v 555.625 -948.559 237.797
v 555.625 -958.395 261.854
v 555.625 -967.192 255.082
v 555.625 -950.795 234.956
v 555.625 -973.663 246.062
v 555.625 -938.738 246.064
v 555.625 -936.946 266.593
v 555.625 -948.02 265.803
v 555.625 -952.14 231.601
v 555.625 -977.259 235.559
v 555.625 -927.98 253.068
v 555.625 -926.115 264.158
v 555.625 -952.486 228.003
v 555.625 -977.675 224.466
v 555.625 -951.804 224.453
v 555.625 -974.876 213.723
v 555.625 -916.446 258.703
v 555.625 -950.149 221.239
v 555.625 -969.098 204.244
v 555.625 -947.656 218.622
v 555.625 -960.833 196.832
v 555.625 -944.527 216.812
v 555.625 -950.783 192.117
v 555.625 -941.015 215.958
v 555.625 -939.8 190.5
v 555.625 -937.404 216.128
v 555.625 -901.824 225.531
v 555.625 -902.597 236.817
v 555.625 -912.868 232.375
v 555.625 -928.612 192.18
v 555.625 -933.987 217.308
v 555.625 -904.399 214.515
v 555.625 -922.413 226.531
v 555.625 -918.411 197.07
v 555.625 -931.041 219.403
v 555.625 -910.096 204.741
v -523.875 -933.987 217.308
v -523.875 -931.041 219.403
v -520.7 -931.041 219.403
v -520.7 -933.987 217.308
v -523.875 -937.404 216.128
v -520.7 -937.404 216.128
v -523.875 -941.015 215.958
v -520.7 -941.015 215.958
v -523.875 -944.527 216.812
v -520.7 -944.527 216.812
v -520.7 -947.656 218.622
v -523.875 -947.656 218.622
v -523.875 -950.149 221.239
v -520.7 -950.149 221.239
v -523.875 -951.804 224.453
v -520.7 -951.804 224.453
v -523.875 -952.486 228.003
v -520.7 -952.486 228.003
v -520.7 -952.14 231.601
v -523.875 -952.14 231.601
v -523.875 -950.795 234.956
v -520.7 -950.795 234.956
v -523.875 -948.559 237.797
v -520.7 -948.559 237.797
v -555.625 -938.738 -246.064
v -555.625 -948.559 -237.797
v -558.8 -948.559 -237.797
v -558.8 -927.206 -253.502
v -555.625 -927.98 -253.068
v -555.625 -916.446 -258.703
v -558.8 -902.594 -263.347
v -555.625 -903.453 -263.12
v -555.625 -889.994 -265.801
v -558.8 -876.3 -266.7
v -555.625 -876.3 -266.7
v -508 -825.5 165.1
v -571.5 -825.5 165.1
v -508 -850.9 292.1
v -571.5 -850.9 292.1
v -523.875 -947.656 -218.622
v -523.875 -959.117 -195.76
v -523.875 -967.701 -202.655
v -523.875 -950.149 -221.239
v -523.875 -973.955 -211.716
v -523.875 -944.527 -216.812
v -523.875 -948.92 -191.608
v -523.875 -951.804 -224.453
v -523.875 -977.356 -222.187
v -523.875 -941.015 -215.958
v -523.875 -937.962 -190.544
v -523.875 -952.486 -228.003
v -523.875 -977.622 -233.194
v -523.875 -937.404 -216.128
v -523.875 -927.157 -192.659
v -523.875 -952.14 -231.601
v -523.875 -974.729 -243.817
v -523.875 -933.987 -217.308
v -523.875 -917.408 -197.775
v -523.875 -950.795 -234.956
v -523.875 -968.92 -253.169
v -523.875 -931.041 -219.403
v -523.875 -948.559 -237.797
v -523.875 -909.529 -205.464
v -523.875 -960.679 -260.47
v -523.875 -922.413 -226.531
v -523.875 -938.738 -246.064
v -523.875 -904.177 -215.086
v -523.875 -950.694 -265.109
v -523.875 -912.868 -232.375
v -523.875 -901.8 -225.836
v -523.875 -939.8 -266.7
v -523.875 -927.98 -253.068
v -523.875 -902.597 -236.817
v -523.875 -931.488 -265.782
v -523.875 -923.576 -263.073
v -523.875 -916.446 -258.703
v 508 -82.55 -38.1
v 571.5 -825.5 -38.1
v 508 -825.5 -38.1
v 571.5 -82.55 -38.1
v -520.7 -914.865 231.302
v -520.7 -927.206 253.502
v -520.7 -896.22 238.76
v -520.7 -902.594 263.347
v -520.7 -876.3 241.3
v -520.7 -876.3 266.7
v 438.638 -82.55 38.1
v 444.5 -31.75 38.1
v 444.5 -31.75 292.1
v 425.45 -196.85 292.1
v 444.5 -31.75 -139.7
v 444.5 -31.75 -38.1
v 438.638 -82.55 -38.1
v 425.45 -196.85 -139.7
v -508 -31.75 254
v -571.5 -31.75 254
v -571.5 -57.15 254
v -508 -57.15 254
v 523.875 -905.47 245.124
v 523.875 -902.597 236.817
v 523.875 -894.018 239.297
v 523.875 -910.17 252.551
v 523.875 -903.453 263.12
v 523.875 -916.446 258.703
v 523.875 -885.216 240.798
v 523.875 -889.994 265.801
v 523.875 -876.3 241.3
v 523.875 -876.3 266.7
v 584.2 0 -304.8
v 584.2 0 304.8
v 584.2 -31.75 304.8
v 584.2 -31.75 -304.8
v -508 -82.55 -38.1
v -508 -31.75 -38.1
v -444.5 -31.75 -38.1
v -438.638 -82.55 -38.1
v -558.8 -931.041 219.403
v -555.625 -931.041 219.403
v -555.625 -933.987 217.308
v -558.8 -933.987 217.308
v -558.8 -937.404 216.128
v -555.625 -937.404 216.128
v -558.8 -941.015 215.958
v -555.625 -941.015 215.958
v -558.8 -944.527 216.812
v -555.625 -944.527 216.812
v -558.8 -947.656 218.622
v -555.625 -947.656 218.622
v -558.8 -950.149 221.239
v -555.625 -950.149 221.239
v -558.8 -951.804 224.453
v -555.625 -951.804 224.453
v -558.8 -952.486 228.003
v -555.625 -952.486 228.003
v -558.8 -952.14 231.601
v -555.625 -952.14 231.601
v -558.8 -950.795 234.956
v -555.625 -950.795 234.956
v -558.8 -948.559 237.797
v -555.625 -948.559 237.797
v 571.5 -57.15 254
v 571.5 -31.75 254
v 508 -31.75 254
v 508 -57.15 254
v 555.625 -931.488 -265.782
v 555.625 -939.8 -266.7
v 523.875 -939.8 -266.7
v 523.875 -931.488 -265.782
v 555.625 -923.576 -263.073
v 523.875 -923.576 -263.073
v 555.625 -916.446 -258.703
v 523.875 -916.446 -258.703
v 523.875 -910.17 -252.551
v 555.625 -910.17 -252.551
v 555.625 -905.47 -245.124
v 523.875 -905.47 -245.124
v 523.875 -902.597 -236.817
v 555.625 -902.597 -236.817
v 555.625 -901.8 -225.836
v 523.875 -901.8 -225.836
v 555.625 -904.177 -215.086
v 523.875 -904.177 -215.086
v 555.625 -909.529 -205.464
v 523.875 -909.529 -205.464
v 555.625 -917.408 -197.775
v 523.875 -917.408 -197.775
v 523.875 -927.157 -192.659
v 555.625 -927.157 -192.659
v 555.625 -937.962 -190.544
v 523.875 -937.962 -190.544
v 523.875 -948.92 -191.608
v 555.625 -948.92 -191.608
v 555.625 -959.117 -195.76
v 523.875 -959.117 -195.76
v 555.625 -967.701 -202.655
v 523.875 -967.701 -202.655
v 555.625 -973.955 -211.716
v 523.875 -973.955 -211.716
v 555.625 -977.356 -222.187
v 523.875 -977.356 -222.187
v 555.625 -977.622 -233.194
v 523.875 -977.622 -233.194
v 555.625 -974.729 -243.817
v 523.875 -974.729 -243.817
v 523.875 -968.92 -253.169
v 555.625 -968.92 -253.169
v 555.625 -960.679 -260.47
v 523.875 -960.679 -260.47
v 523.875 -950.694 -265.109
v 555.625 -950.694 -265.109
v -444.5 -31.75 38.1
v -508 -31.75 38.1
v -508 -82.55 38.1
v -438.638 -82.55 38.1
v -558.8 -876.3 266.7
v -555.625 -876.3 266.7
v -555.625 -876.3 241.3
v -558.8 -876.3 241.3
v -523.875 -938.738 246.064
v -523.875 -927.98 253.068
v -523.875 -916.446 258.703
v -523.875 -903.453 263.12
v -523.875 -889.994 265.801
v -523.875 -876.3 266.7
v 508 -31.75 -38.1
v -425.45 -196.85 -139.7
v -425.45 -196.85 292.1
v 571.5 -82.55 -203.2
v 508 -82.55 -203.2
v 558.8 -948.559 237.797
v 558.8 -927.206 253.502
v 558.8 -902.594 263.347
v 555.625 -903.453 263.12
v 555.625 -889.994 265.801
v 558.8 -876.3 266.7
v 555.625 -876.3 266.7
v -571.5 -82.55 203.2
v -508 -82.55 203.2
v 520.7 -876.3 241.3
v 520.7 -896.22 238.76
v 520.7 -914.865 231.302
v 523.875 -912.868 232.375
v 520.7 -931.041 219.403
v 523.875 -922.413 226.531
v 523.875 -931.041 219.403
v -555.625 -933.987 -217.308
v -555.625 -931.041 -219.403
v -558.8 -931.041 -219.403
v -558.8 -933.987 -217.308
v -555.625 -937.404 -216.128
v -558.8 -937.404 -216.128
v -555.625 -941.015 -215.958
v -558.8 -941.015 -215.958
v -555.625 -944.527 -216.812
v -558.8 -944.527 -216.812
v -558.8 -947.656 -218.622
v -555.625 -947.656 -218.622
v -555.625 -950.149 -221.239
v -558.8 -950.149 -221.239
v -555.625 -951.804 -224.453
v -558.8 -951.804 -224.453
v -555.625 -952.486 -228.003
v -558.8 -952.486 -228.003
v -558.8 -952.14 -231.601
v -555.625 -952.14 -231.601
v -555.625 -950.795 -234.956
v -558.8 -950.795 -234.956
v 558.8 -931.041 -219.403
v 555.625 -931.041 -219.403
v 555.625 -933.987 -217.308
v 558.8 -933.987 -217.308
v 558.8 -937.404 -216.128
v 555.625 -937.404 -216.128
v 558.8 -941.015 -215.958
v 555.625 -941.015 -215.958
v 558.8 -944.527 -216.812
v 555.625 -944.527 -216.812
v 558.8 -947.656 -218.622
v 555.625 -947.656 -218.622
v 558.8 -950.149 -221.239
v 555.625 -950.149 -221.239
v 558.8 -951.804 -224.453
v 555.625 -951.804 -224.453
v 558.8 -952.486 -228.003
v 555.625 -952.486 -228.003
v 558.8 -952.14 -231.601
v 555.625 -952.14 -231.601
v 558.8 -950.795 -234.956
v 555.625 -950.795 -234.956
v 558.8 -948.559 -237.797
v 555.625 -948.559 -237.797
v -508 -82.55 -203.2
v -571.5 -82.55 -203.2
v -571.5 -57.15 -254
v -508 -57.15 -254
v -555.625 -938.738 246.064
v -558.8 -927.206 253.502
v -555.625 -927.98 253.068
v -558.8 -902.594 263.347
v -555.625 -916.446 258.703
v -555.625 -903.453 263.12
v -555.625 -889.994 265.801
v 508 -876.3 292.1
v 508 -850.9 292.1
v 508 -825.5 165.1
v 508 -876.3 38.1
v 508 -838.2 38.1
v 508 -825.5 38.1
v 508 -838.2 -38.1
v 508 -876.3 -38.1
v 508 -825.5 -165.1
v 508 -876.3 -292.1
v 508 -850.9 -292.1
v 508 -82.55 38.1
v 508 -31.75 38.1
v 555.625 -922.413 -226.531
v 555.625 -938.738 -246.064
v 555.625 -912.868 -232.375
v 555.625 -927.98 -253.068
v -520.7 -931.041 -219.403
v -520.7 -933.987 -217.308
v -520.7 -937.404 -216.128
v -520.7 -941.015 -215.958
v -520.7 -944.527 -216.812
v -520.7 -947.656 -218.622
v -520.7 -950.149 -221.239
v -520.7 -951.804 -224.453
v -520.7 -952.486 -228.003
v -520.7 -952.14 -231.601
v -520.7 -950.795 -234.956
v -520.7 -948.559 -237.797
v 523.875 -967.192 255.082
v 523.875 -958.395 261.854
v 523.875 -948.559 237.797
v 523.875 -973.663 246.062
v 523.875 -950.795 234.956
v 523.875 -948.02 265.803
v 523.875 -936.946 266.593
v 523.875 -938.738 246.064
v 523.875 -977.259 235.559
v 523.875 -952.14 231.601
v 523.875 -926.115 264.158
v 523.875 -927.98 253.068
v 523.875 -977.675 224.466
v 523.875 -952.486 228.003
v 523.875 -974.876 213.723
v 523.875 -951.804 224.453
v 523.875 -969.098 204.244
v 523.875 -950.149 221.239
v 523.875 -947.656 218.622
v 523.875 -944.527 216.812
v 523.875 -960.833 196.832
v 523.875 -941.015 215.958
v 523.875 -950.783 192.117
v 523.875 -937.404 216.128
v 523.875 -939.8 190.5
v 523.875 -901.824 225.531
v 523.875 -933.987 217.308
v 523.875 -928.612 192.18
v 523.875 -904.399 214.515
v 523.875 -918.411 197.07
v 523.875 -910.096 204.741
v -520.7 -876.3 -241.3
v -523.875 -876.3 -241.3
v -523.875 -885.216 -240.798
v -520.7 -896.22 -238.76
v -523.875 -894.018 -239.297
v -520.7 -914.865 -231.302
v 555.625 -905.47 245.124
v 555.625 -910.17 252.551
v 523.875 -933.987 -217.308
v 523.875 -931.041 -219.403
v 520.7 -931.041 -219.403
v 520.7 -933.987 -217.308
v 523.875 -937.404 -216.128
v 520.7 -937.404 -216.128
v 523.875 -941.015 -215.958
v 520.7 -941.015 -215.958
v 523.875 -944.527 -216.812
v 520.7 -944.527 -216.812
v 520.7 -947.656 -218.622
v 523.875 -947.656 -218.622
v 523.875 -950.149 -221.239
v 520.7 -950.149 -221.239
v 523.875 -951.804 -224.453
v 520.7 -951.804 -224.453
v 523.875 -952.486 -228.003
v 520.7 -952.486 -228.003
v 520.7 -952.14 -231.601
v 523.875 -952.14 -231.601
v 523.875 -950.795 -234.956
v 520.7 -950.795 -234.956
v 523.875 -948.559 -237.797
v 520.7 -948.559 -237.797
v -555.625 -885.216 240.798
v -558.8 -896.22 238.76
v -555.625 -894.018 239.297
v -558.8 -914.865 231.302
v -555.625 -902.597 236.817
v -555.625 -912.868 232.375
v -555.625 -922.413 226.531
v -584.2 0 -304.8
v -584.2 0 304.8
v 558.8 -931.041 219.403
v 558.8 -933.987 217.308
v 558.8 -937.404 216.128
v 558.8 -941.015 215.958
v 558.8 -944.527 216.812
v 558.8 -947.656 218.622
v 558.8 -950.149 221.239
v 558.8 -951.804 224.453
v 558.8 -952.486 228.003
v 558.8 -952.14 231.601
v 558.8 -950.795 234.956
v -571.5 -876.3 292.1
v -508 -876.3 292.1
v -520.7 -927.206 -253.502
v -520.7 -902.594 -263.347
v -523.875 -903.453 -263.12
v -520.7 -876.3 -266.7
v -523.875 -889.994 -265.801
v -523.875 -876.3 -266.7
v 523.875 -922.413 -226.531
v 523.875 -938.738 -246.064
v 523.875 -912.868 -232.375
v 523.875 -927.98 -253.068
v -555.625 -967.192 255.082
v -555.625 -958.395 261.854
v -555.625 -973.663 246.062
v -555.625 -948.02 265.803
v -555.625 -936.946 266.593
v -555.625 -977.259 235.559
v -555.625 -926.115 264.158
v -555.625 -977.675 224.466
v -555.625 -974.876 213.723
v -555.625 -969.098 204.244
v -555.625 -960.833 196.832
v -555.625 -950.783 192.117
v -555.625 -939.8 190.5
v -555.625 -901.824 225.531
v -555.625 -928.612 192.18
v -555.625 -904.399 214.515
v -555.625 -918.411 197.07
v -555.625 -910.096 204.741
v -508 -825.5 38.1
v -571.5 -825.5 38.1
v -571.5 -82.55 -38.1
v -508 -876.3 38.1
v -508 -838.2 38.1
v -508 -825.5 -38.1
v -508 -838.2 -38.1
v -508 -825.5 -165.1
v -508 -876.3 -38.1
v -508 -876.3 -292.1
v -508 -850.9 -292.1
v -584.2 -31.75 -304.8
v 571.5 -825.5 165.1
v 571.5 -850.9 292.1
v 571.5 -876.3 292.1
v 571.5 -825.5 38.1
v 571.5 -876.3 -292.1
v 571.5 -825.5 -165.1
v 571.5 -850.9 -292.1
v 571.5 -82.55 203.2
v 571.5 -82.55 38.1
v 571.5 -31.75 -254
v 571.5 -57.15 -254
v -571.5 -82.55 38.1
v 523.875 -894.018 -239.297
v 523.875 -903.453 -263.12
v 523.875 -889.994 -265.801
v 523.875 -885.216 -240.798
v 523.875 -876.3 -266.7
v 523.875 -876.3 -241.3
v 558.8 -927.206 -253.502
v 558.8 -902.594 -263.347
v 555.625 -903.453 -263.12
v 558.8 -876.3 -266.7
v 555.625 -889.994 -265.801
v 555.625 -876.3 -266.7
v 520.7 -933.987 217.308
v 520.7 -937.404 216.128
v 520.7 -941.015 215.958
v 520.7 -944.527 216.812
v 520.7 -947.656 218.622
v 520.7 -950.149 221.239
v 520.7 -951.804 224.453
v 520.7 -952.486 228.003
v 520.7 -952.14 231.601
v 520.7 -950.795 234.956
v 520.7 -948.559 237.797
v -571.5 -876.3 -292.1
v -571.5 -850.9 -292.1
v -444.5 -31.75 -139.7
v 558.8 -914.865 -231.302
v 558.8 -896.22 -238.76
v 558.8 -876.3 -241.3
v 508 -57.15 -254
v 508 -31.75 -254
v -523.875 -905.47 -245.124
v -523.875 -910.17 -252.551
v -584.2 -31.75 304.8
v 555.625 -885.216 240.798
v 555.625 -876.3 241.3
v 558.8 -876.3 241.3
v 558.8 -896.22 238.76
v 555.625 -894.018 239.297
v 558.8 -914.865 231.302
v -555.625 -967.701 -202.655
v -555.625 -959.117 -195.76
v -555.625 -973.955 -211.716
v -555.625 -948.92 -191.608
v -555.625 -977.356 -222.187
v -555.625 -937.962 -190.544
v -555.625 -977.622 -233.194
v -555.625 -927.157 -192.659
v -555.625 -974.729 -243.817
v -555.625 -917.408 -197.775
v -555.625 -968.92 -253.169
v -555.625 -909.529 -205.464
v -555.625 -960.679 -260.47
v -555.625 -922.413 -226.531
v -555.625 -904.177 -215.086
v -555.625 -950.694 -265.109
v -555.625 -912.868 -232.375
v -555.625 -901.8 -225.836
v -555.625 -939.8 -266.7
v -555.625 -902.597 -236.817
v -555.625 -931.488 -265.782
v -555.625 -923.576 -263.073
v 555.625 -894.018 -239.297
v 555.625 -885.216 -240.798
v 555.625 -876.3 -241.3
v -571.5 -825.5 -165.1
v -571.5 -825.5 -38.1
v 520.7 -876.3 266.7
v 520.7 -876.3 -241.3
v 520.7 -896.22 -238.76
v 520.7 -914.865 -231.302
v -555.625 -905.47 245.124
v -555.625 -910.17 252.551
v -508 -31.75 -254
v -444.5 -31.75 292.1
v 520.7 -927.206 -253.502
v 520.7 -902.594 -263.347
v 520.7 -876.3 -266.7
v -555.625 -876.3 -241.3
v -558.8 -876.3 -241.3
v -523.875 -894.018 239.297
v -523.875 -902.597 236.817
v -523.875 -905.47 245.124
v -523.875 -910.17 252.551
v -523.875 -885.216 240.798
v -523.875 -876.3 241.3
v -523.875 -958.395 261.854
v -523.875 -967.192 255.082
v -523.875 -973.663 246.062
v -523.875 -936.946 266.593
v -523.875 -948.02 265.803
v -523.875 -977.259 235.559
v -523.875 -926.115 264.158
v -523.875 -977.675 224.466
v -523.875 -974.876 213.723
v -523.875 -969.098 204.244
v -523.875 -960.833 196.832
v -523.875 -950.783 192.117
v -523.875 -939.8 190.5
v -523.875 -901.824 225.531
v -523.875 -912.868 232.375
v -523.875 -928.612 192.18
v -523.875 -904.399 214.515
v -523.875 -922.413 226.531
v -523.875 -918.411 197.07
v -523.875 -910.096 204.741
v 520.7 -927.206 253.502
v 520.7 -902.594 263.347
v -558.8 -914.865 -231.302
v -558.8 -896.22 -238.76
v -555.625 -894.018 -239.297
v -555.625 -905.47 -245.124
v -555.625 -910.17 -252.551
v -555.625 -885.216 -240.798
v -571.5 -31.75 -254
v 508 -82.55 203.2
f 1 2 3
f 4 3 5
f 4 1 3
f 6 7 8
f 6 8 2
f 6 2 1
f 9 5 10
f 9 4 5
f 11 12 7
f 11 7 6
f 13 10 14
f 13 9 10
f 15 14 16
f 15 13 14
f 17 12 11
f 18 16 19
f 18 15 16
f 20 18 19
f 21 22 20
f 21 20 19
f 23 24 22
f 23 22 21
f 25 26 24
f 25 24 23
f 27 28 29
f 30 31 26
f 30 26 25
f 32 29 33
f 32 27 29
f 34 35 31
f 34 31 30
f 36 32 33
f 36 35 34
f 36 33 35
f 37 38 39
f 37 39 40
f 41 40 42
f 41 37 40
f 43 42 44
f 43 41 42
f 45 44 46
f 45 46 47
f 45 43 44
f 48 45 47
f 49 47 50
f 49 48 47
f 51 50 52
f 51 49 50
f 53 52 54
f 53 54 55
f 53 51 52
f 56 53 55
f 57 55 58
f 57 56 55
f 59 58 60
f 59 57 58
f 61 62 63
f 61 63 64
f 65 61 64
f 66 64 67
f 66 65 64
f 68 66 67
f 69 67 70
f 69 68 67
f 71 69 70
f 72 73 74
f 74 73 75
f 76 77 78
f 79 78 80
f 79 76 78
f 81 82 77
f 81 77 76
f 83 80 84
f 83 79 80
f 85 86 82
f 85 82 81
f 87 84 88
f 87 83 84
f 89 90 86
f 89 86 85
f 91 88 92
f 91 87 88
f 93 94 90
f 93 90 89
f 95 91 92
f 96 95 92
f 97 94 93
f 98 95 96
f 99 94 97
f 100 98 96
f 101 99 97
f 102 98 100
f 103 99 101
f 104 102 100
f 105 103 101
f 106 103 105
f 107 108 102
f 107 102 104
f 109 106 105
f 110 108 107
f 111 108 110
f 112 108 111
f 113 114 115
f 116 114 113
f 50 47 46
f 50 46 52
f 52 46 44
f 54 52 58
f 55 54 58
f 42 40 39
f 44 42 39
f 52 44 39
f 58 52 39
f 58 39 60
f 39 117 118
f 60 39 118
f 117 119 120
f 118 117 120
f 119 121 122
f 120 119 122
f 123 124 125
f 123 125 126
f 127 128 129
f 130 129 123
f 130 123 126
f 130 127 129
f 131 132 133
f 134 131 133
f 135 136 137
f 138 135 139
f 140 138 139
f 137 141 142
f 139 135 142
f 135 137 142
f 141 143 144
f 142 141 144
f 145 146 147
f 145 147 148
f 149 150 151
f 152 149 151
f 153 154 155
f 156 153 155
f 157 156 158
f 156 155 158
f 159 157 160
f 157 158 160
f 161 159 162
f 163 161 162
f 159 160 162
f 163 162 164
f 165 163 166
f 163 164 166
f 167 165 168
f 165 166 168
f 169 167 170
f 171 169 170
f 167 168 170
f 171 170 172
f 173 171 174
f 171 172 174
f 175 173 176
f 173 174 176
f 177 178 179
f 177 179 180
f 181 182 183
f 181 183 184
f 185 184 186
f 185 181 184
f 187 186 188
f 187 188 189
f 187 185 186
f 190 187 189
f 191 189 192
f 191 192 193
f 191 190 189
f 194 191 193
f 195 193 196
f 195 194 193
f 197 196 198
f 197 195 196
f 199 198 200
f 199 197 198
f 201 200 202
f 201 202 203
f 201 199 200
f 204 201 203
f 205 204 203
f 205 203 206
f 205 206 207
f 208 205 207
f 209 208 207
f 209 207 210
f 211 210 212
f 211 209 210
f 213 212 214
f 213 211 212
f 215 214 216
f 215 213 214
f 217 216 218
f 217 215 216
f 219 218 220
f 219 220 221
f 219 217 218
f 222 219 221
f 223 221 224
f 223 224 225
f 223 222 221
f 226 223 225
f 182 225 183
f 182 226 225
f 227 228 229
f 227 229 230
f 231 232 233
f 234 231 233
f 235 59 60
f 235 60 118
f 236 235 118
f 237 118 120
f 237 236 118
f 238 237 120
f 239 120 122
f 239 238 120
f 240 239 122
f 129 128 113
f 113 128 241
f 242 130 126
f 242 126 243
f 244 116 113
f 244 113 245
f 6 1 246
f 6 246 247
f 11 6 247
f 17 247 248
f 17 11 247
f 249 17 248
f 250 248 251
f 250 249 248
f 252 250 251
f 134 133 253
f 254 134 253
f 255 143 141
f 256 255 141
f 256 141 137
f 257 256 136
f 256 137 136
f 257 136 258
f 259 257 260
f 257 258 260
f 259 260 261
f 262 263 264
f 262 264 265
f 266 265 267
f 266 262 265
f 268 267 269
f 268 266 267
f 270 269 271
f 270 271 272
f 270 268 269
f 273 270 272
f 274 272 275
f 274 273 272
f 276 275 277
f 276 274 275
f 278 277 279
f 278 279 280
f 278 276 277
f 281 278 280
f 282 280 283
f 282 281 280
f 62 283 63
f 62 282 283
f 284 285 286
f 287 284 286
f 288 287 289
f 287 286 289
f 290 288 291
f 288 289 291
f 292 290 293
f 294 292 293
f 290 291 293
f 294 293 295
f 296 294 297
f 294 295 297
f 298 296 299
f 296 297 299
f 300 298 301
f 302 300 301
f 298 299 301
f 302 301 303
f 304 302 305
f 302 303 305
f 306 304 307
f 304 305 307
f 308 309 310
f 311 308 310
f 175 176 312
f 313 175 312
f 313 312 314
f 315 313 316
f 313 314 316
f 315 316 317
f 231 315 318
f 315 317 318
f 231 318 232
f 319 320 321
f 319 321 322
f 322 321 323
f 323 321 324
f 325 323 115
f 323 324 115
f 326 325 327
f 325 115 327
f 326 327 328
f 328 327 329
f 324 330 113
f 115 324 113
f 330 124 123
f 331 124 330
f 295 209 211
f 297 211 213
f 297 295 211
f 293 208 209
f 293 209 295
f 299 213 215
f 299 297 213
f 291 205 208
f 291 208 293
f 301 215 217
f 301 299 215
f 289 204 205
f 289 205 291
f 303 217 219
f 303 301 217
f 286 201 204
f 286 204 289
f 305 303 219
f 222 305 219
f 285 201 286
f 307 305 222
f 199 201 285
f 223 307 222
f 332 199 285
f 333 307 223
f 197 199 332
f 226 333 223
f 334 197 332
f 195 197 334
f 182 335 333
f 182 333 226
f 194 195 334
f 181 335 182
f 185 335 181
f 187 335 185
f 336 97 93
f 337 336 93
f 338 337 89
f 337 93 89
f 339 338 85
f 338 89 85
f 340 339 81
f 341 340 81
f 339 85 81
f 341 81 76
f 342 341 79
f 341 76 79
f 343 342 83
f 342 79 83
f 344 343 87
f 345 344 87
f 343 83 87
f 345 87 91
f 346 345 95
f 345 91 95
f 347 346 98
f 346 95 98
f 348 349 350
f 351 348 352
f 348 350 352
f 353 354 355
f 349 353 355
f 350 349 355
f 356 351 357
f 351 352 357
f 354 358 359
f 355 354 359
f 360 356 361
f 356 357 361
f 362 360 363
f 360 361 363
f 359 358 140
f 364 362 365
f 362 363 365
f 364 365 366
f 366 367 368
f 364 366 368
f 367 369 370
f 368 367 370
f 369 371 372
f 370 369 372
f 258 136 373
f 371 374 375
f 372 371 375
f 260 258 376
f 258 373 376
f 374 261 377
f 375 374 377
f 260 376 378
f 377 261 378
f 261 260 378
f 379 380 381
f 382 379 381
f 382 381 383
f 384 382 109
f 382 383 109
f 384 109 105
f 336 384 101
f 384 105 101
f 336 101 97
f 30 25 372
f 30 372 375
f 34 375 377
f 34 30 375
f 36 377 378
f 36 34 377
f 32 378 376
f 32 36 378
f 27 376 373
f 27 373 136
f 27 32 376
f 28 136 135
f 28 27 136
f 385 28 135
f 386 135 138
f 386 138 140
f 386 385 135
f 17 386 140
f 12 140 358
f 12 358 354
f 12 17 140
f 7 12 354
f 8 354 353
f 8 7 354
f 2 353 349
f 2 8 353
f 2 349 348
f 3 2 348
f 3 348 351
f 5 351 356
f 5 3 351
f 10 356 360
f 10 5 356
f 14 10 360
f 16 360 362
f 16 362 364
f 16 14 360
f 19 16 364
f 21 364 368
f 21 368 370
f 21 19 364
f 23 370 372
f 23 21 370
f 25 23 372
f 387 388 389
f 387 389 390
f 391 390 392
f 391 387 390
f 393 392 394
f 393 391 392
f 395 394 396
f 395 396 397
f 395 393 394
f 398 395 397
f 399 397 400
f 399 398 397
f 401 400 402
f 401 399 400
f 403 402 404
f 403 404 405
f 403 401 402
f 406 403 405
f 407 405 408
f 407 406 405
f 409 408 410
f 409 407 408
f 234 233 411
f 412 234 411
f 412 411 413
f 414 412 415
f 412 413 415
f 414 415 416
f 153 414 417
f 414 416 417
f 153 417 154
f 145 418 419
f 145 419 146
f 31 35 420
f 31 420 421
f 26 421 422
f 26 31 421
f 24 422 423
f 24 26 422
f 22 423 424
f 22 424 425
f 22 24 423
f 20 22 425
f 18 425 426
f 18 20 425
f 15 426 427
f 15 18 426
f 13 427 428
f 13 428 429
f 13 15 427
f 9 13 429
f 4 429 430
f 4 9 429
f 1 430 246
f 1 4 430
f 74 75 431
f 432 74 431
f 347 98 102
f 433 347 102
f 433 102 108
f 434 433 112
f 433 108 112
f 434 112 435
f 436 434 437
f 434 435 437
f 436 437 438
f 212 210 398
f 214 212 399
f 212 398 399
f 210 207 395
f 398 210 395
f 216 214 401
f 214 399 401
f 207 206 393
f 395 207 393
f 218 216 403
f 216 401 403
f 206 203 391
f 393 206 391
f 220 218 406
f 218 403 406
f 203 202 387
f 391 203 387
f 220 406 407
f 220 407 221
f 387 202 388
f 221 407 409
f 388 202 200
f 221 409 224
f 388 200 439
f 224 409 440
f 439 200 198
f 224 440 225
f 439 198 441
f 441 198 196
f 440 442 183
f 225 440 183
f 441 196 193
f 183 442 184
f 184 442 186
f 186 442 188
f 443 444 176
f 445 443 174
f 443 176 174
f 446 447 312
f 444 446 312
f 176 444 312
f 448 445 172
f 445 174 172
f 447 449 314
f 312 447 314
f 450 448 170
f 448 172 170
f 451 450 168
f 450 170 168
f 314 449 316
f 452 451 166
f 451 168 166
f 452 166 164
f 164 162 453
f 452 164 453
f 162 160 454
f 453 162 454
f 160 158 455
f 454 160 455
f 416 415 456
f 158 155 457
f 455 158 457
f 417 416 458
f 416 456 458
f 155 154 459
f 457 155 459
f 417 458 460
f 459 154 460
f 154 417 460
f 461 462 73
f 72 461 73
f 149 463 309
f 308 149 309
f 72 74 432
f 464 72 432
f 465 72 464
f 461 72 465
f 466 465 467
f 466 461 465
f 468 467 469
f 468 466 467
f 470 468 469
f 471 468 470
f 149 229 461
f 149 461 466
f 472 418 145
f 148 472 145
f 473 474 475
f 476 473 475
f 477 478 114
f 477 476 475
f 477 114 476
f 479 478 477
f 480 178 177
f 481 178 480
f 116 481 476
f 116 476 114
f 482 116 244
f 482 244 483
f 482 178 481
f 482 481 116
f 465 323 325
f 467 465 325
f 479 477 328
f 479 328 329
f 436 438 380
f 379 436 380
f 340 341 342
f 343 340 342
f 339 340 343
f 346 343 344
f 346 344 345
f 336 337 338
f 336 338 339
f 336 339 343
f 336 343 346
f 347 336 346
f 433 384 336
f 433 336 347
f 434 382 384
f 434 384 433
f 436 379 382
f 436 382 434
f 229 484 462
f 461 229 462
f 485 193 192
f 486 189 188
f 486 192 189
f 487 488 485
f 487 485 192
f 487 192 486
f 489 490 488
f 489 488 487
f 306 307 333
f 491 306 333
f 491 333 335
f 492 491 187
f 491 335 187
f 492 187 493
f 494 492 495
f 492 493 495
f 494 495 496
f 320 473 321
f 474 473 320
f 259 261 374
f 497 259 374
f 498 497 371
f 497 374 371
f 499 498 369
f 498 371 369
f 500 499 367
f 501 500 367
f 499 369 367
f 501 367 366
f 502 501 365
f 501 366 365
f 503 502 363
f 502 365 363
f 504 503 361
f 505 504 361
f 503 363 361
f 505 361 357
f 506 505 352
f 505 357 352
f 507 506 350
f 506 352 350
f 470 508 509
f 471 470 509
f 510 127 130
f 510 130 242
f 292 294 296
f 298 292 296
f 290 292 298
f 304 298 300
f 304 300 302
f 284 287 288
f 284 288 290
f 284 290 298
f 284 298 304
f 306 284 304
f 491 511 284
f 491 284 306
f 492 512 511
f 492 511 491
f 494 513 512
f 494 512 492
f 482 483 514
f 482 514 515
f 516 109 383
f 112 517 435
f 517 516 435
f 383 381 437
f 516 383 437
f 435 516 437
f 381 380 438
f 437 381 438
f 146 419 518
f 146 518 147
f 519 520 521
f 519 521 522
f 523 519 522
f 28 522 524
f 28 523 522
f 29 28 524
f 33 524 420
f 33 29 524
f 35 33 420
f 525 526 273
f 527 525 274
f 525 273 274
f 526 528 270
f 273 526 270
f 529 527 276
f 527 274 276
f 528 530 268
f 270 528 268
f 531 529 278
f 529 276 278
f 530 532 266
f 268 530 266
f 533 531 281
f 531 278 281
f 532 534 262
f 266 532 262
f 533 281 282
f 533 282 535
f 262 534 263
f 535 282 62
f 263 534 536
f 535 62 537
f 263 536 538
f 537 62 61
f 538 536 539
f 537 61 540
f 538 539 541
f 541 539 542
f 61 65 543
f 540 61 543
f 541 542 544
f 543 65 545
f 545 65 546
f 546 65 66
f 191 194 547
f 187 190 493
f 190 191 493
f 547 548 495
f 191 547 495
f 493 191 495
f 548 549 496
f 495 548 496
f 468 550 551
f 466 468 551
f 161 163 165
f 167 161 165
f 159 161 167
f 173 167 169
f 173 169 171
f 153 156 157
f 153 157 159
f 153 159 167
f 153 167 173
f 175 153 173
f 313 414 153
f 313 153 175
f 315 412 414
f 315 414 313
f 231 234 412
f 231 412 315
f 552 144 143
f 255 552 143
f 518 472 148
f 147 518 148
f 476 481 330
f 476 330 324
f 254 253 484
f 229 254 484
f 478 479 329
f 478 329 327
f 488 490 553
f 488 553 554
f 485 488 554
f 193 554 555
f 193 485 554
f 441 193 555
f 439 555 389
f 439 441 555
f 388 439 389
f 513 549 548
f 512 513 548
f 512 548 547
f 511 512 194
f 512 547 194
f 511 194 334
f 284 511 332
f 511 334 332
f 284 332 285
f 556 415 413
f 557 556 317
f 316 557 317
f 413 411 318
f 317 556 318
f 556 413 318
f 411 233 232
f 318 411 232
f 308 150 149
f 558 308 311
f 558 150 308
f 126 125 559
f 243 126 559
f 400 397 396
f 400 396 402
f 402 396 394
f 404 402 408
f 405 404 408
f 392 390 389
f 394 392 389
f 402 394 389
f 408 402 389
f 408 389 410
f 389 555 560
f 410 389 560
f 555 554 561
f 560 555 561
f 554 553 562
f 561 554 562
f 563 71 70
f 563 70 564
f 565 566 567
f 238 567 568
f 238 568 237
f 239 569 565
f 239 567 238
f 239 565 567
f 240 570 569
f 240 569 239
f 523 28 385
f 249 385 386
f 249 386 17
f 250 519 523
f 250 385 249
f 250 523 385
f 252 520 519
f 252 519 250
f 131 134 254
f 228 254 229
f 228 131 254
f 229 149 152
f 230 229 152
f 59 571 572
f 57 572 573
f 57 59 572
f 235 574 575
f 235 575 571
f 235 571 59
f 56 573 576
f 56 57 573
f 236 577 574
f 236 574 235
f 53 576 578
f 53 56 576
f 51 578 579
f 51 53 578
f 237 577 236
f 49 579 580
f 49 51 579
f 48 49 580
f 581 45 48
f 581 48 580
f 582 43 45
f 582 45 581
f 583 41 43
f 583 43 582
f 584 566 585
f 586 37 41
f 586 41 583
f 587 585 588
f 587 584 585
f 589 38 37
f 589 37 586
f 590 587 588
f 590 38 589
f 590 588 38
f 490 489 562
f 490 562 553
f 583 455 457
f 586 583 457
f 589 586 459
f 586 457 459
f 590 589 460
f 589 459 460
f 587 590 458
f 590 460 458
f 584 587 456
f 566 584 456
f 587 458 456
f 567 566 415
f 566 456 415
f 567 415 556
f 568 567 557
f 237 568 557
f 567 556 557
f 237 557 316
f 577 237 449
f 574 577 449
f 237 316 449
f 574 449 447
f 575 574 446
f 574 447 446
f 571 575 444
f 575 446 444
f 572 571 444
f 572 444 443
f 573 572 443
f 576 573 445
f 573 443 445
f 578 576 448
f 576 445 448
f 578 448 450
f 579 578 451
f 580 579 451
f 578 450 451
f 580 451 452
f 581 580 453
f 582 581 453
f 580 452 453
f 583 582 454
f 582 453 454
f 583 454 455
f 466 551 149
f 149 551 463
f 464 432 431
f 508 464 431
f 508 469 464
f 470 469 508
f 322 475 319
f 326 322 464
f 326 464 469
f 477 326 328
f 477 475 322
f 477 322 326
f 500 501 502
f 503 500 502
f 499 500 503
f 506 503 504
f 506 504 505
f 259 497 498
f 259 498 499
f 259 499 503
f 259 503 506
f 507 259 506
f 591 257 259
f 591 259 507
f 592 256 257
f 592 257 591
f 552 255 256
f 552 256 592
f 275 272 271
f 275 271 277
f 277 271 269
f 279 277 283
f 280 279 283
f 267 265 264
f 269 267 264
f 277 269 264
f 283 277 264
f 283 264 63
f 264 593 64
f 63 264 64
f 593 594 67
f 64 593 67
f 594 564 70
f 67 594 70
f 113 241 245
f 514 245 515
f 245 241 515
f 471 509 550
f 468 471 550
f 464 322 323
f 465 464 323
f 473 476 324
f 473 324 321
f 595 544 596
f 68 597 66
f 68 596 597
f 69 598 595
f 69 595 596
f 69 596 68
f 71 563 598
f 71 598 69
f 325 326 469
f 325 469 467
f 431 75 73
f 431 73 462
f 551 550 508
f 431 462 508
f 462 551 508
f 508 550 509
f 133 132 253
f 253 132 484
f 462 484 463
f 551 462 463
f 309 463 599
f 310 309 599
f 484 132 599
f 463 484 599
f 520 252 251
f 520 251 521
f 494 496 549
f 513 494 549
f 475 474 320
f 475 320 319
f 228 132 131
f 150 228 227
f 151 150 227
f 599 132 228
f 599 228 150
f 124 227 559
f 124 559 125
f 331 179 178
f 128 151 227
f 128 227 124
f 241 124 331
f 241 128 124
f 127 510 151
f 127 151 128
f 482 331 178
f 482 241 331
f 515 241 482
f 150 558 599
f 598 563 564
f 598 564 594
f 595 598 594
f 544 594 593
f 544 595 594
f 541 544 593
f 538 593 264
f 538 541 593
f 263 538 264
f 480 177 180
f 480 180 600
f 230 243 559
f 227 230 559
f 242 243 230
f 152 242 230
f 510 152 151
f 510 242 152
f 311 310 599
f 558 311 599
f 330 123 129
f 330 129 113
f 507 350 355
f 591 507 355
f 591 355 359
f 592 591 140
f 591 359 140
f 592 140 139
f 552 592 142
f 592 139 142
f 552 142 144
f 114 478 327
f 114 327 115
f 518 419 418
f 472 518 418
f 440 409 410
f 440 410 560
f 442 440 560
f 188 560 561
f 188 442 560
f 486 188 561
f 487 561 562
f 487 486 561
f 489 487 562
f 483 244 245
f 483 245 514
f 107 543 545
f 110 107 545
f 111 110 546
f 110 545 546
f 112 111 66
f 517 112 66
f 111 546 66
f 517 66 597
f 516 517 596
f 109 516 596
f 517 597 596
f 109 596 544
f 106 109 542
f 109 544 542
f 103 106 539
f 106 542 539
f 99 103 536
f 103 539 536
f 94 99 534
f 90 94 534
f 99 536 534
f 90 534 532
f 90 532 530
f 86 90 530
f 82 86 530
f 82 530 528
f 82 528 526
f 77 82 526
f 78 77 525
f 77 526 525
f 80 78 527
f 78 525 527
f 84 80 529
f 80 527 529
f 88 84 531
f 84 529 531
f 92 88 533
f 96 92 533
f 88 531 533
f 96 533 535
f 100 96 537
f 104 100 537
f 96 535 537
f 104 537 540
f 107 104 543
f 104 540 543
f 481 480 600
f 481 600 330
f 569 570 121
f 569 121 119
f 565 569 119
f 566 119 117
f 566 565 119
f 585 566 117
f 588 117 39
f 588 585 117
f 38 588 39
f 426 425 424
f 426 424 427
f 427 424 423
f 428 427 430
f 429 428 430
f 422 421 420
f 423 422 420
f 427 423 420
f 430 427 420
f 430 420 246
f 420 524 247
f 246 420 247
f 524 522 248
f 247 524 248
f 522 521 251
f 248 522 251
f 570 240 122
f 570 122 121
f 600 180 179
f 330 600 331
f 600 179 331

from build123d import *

# Parameters (mm, degrees)
SKETCH2_W                       = 1168.4
SKETCH2_H                       = 609.6
BOSS_EXTRUDE1_DEPTH             = 31.75
SKETCH4_W                       = 1143
SKETCH4_H                       = 50.8
BOSS_EXTRUDE2_DEPTH             = 38.1
BOSS_EXTRUDE3_DEPTH             = 292.1
BOSS_EXTRUDE3_DEPTH_BACK        = 139.7
BOSS_EXTRUDE4_DEPTH             = 63.5
BOSS_EXTRUDE7_REACH             = 1098.401
SKETCH10_W                      = 76.2
SKETCH10_H                      = 38.1
BOSS_EXTRUDE7_DIRECTION_2_REACH = 1098.401
SKETCH8_R                       = 38.1
BOSS_EXTRUDE5_DEPTH             = 15.875
BOSS_EXTRUDE5_2_DEPTH           = 15.875
BOSS_EXTRUDE6_DEPTH             = 3.175


with BuildPart() as part:
    # Sketch2 → Boss-Extrude1 (new body)
    with BuildSketch(Plane(origin=(0, 0, 0), x_dir=(1, 0, 0), z_dir=(0, 1, 0))):
        Rectangle(SKETCH2_W, SKETCH2_H)
    extrude(amount=-BOSS_EXTRUDE1_DEPTH)


with BuildPart() as body_2:
    # Sketch4 → Boss-Extrude2 (new, symmetric)
    with BuildSketch(Plane.XY):
        with Locations((0, -57.15)):
            Rectangle(SKETCH4_W, SKETCH4_H)
    extrude(amount=BOSS_EXTRUDE2_DEPTH, both=True)

    # Sketch5 → Boss-Extrude3 (add, two sides: drawn at the far end of the back side and taken through both)
    with BuildSketch(Plane.XY.offset(-BOSS_EXTRUDE3_DEPTH_BACK)):
        Polygon((-444.5, -31.75), (444.5, -31.75), (425.45, -196.85), (-425.45, -196.85), align=None)
    extrude(amount=BOSS_EXTRUDE3_DEPTH + BOSS_EXTRUDE3_DEPTH_BACK)

    # Sketch6 → Boss-Extrude4 (add)
    with BuildSketch(Plane(origin=(571.5, 0, 0), x_dir=(0, 0, -1), z_dir=(1, 0, 0))):
        Polygon((-38.1, -825.5), (-165.1, -825.5), (-292.1, -850.9), (-292.1, -876.3), (292.1, -876.3), (292.1, -850.9), (165.1, -825.5), (38.1, -825.5), (38.1, -82.55), (203.2, -82.55), (254, -57.15), (254, -31.75), (-254, -31.75), (-254, -57.15), (-203.2, -82.55), (-38.1, -82.55), align=None)
    boss_extrude4 = extrude(amount=-BOSS_EXTRUDE4_DEPTH)

    # Mirror1: Boss-Extrude4 across plane
    add(boss_extrude4.mirror(Plane(origin=(0, 0, 0), x_dir=(0, 0, 1), z_dir=(1, 0, 0))))

    # Boss-Extrude7: up to this face of the body (flat: up to its plane)
    boss_extrude7_end = Plane(body_2.part.faces().sort_by_distance((508, -581.066100324, 0))[0])
    # Sketch10 → Boss-Extrude7 (add, up to the picked face)
    with BuildSketch(Plane(origin=(0, 0, 0), x_dir=(0, 0, -1), z_dir=(1, 0, 0)), mode=Mode.PRIVATE) as boss_extrude7_sk1:
        with Locations((0, -857.25)):
            Rectangle(SKETCH10_W, SKETCH10_H)
    boss_extrude7_tool1 = split(extrude(boss_extrude7_sk1.sketch, amount=BOSS_EXTRUDE7_REACH, mode=Mode.PRIVATE), bisect_by=boss_extrude7_end, keep=Keep.BOTH, mode=Mode.PRIVATE)
    add(boss_extrude7_tool1.solids().sort_by(Axis((0, -857.25, 0), (1, 0, 0)))[0])

    # Boss-Extrude7 direction 2: up to this face of the body (flat: up to its plane)
    boss_extrude7_direction_2_end = Plane(body_2.part.faces().sort_by_distance((-508, -581.066100324, 0))[0])
    # Sketch10 → Boss-Extrude7 direction 2 (add, up to the picked face)
    with BuildSketch(Plane(origin=(0, 0, 0), x_dir=(0, 0, -1), z_dir=(1, 0, 0)), mode=Mode.PRIVATE) as boss_extrude7_direction_2_sk1:
        with Locations((0, -857.25)):
            Rectangle(SKETCH10_W, SKETCH10_H)
    boss_extrude7_direction_2_tool1 = split(extrude(boss_extrude7_direction_2_sk1.sketch, amount=-BOSS_EXTRUDE7_DIRECTION_2_REACH, mode=Mode.PRIVATE), bisect_by=boss_extrude7_direction_2_end, keep=Keep.BOTH, mode=Mode.PRIVATE)
    add(boss_extrude7_direction_2_tool1.solids().sort_by(Axis((0, -857.25, 0), (-1, 0, 0)))[0])


with BuildPart() as body_3:
    # Sketch8 → Boss-Extrude5 (new, symmetric)
    with BuildSketch(Plane(origin=(539.75, 0, 0), x_dir=(0, 0, -1), z_dir=(1, 0, 0))):
        with Locations((-228.6, -939.8)):
            Circle(SKETCH8_R)
    extrude(amount=BOSS_EXTRUDE5_DEPTH, both=True)


with BuildPart() as body_4:
    # Sketch8 → Boss-Extrude5 2 (new, symmetric)
    with BuildSketch(Plane(origin=(539.75, 0, 0), x_dir=(0, 0, -1), z_dir=(1, 0, 0))):
        with Locations((228.6, -939.8)):
            Circle(SKETCH8_R)
    extrude(amount=BOSS_EXTRUDE5_2_DEPTH, both=True)


    add(body_3.part)  # Boss-Extrude6 merges body 3
    # Sketch9 → Boss-Extrude6 (add)
    with BuildSketch(Plane(origin=(555.625, 0, 0), x_dir=(0, 0, -1), z_dir=(1, 0, 0))):
        with BuildLine():
            Line((-266.7, -876.3), (-241.3, -876.3))
            ThreePointArc((-241.3, -876.3), (-235.622837339, -905.779134936), (-219.403448276, -931.04137931))
            ThreePointArc((-219.403448276, -931.04137931), (-219.84137931, -948.996551724), (-237.796551724, -948.55862069))
            ThreePointArc((-237.796551724, -948.55862069), (-259.206145288, -915.212458115), (-266.7, -876.3))
        make_face()
        with BuildLine():
            Line((266.7, -876.3), (241.3, -876.3))
            ThreePointArc((241.3, -876.3), (235.622837339, -905.779134936), (219.403448276, -931.04137931))
            ThreePointArc((219.403448276, -931.04137931), (219.84137931, -948.996551724), (237.796551724, -948.55862069))
            ThreePointArc((237.796551724, -948.55862069), (259.206145288, -915.212458115), (266.7, -876.3))
        make_face()
    boss_extrude6 = extrude(amount=BOSS_EXTRUDE6_DEPTH)

    # Mirror2: Boss-Extrude6 across plane
    add(boss_extrude6.mirror(Plane(origin=(539.75, 0, 0), x_dir=(0, 0, 1), z_dir=(1, 0, 0))))


with BuildPart() as body_4_2:
    # Mirror3: mirrored copy
    add(body_4.part.mirror(Plane(origin=(0, 0, 0), x_dir=(0, 0, 1), z_dir=(1, 0, 0))))


solid = Compound([part.part, body_2.part, body_4.part, body_4_2.part])
